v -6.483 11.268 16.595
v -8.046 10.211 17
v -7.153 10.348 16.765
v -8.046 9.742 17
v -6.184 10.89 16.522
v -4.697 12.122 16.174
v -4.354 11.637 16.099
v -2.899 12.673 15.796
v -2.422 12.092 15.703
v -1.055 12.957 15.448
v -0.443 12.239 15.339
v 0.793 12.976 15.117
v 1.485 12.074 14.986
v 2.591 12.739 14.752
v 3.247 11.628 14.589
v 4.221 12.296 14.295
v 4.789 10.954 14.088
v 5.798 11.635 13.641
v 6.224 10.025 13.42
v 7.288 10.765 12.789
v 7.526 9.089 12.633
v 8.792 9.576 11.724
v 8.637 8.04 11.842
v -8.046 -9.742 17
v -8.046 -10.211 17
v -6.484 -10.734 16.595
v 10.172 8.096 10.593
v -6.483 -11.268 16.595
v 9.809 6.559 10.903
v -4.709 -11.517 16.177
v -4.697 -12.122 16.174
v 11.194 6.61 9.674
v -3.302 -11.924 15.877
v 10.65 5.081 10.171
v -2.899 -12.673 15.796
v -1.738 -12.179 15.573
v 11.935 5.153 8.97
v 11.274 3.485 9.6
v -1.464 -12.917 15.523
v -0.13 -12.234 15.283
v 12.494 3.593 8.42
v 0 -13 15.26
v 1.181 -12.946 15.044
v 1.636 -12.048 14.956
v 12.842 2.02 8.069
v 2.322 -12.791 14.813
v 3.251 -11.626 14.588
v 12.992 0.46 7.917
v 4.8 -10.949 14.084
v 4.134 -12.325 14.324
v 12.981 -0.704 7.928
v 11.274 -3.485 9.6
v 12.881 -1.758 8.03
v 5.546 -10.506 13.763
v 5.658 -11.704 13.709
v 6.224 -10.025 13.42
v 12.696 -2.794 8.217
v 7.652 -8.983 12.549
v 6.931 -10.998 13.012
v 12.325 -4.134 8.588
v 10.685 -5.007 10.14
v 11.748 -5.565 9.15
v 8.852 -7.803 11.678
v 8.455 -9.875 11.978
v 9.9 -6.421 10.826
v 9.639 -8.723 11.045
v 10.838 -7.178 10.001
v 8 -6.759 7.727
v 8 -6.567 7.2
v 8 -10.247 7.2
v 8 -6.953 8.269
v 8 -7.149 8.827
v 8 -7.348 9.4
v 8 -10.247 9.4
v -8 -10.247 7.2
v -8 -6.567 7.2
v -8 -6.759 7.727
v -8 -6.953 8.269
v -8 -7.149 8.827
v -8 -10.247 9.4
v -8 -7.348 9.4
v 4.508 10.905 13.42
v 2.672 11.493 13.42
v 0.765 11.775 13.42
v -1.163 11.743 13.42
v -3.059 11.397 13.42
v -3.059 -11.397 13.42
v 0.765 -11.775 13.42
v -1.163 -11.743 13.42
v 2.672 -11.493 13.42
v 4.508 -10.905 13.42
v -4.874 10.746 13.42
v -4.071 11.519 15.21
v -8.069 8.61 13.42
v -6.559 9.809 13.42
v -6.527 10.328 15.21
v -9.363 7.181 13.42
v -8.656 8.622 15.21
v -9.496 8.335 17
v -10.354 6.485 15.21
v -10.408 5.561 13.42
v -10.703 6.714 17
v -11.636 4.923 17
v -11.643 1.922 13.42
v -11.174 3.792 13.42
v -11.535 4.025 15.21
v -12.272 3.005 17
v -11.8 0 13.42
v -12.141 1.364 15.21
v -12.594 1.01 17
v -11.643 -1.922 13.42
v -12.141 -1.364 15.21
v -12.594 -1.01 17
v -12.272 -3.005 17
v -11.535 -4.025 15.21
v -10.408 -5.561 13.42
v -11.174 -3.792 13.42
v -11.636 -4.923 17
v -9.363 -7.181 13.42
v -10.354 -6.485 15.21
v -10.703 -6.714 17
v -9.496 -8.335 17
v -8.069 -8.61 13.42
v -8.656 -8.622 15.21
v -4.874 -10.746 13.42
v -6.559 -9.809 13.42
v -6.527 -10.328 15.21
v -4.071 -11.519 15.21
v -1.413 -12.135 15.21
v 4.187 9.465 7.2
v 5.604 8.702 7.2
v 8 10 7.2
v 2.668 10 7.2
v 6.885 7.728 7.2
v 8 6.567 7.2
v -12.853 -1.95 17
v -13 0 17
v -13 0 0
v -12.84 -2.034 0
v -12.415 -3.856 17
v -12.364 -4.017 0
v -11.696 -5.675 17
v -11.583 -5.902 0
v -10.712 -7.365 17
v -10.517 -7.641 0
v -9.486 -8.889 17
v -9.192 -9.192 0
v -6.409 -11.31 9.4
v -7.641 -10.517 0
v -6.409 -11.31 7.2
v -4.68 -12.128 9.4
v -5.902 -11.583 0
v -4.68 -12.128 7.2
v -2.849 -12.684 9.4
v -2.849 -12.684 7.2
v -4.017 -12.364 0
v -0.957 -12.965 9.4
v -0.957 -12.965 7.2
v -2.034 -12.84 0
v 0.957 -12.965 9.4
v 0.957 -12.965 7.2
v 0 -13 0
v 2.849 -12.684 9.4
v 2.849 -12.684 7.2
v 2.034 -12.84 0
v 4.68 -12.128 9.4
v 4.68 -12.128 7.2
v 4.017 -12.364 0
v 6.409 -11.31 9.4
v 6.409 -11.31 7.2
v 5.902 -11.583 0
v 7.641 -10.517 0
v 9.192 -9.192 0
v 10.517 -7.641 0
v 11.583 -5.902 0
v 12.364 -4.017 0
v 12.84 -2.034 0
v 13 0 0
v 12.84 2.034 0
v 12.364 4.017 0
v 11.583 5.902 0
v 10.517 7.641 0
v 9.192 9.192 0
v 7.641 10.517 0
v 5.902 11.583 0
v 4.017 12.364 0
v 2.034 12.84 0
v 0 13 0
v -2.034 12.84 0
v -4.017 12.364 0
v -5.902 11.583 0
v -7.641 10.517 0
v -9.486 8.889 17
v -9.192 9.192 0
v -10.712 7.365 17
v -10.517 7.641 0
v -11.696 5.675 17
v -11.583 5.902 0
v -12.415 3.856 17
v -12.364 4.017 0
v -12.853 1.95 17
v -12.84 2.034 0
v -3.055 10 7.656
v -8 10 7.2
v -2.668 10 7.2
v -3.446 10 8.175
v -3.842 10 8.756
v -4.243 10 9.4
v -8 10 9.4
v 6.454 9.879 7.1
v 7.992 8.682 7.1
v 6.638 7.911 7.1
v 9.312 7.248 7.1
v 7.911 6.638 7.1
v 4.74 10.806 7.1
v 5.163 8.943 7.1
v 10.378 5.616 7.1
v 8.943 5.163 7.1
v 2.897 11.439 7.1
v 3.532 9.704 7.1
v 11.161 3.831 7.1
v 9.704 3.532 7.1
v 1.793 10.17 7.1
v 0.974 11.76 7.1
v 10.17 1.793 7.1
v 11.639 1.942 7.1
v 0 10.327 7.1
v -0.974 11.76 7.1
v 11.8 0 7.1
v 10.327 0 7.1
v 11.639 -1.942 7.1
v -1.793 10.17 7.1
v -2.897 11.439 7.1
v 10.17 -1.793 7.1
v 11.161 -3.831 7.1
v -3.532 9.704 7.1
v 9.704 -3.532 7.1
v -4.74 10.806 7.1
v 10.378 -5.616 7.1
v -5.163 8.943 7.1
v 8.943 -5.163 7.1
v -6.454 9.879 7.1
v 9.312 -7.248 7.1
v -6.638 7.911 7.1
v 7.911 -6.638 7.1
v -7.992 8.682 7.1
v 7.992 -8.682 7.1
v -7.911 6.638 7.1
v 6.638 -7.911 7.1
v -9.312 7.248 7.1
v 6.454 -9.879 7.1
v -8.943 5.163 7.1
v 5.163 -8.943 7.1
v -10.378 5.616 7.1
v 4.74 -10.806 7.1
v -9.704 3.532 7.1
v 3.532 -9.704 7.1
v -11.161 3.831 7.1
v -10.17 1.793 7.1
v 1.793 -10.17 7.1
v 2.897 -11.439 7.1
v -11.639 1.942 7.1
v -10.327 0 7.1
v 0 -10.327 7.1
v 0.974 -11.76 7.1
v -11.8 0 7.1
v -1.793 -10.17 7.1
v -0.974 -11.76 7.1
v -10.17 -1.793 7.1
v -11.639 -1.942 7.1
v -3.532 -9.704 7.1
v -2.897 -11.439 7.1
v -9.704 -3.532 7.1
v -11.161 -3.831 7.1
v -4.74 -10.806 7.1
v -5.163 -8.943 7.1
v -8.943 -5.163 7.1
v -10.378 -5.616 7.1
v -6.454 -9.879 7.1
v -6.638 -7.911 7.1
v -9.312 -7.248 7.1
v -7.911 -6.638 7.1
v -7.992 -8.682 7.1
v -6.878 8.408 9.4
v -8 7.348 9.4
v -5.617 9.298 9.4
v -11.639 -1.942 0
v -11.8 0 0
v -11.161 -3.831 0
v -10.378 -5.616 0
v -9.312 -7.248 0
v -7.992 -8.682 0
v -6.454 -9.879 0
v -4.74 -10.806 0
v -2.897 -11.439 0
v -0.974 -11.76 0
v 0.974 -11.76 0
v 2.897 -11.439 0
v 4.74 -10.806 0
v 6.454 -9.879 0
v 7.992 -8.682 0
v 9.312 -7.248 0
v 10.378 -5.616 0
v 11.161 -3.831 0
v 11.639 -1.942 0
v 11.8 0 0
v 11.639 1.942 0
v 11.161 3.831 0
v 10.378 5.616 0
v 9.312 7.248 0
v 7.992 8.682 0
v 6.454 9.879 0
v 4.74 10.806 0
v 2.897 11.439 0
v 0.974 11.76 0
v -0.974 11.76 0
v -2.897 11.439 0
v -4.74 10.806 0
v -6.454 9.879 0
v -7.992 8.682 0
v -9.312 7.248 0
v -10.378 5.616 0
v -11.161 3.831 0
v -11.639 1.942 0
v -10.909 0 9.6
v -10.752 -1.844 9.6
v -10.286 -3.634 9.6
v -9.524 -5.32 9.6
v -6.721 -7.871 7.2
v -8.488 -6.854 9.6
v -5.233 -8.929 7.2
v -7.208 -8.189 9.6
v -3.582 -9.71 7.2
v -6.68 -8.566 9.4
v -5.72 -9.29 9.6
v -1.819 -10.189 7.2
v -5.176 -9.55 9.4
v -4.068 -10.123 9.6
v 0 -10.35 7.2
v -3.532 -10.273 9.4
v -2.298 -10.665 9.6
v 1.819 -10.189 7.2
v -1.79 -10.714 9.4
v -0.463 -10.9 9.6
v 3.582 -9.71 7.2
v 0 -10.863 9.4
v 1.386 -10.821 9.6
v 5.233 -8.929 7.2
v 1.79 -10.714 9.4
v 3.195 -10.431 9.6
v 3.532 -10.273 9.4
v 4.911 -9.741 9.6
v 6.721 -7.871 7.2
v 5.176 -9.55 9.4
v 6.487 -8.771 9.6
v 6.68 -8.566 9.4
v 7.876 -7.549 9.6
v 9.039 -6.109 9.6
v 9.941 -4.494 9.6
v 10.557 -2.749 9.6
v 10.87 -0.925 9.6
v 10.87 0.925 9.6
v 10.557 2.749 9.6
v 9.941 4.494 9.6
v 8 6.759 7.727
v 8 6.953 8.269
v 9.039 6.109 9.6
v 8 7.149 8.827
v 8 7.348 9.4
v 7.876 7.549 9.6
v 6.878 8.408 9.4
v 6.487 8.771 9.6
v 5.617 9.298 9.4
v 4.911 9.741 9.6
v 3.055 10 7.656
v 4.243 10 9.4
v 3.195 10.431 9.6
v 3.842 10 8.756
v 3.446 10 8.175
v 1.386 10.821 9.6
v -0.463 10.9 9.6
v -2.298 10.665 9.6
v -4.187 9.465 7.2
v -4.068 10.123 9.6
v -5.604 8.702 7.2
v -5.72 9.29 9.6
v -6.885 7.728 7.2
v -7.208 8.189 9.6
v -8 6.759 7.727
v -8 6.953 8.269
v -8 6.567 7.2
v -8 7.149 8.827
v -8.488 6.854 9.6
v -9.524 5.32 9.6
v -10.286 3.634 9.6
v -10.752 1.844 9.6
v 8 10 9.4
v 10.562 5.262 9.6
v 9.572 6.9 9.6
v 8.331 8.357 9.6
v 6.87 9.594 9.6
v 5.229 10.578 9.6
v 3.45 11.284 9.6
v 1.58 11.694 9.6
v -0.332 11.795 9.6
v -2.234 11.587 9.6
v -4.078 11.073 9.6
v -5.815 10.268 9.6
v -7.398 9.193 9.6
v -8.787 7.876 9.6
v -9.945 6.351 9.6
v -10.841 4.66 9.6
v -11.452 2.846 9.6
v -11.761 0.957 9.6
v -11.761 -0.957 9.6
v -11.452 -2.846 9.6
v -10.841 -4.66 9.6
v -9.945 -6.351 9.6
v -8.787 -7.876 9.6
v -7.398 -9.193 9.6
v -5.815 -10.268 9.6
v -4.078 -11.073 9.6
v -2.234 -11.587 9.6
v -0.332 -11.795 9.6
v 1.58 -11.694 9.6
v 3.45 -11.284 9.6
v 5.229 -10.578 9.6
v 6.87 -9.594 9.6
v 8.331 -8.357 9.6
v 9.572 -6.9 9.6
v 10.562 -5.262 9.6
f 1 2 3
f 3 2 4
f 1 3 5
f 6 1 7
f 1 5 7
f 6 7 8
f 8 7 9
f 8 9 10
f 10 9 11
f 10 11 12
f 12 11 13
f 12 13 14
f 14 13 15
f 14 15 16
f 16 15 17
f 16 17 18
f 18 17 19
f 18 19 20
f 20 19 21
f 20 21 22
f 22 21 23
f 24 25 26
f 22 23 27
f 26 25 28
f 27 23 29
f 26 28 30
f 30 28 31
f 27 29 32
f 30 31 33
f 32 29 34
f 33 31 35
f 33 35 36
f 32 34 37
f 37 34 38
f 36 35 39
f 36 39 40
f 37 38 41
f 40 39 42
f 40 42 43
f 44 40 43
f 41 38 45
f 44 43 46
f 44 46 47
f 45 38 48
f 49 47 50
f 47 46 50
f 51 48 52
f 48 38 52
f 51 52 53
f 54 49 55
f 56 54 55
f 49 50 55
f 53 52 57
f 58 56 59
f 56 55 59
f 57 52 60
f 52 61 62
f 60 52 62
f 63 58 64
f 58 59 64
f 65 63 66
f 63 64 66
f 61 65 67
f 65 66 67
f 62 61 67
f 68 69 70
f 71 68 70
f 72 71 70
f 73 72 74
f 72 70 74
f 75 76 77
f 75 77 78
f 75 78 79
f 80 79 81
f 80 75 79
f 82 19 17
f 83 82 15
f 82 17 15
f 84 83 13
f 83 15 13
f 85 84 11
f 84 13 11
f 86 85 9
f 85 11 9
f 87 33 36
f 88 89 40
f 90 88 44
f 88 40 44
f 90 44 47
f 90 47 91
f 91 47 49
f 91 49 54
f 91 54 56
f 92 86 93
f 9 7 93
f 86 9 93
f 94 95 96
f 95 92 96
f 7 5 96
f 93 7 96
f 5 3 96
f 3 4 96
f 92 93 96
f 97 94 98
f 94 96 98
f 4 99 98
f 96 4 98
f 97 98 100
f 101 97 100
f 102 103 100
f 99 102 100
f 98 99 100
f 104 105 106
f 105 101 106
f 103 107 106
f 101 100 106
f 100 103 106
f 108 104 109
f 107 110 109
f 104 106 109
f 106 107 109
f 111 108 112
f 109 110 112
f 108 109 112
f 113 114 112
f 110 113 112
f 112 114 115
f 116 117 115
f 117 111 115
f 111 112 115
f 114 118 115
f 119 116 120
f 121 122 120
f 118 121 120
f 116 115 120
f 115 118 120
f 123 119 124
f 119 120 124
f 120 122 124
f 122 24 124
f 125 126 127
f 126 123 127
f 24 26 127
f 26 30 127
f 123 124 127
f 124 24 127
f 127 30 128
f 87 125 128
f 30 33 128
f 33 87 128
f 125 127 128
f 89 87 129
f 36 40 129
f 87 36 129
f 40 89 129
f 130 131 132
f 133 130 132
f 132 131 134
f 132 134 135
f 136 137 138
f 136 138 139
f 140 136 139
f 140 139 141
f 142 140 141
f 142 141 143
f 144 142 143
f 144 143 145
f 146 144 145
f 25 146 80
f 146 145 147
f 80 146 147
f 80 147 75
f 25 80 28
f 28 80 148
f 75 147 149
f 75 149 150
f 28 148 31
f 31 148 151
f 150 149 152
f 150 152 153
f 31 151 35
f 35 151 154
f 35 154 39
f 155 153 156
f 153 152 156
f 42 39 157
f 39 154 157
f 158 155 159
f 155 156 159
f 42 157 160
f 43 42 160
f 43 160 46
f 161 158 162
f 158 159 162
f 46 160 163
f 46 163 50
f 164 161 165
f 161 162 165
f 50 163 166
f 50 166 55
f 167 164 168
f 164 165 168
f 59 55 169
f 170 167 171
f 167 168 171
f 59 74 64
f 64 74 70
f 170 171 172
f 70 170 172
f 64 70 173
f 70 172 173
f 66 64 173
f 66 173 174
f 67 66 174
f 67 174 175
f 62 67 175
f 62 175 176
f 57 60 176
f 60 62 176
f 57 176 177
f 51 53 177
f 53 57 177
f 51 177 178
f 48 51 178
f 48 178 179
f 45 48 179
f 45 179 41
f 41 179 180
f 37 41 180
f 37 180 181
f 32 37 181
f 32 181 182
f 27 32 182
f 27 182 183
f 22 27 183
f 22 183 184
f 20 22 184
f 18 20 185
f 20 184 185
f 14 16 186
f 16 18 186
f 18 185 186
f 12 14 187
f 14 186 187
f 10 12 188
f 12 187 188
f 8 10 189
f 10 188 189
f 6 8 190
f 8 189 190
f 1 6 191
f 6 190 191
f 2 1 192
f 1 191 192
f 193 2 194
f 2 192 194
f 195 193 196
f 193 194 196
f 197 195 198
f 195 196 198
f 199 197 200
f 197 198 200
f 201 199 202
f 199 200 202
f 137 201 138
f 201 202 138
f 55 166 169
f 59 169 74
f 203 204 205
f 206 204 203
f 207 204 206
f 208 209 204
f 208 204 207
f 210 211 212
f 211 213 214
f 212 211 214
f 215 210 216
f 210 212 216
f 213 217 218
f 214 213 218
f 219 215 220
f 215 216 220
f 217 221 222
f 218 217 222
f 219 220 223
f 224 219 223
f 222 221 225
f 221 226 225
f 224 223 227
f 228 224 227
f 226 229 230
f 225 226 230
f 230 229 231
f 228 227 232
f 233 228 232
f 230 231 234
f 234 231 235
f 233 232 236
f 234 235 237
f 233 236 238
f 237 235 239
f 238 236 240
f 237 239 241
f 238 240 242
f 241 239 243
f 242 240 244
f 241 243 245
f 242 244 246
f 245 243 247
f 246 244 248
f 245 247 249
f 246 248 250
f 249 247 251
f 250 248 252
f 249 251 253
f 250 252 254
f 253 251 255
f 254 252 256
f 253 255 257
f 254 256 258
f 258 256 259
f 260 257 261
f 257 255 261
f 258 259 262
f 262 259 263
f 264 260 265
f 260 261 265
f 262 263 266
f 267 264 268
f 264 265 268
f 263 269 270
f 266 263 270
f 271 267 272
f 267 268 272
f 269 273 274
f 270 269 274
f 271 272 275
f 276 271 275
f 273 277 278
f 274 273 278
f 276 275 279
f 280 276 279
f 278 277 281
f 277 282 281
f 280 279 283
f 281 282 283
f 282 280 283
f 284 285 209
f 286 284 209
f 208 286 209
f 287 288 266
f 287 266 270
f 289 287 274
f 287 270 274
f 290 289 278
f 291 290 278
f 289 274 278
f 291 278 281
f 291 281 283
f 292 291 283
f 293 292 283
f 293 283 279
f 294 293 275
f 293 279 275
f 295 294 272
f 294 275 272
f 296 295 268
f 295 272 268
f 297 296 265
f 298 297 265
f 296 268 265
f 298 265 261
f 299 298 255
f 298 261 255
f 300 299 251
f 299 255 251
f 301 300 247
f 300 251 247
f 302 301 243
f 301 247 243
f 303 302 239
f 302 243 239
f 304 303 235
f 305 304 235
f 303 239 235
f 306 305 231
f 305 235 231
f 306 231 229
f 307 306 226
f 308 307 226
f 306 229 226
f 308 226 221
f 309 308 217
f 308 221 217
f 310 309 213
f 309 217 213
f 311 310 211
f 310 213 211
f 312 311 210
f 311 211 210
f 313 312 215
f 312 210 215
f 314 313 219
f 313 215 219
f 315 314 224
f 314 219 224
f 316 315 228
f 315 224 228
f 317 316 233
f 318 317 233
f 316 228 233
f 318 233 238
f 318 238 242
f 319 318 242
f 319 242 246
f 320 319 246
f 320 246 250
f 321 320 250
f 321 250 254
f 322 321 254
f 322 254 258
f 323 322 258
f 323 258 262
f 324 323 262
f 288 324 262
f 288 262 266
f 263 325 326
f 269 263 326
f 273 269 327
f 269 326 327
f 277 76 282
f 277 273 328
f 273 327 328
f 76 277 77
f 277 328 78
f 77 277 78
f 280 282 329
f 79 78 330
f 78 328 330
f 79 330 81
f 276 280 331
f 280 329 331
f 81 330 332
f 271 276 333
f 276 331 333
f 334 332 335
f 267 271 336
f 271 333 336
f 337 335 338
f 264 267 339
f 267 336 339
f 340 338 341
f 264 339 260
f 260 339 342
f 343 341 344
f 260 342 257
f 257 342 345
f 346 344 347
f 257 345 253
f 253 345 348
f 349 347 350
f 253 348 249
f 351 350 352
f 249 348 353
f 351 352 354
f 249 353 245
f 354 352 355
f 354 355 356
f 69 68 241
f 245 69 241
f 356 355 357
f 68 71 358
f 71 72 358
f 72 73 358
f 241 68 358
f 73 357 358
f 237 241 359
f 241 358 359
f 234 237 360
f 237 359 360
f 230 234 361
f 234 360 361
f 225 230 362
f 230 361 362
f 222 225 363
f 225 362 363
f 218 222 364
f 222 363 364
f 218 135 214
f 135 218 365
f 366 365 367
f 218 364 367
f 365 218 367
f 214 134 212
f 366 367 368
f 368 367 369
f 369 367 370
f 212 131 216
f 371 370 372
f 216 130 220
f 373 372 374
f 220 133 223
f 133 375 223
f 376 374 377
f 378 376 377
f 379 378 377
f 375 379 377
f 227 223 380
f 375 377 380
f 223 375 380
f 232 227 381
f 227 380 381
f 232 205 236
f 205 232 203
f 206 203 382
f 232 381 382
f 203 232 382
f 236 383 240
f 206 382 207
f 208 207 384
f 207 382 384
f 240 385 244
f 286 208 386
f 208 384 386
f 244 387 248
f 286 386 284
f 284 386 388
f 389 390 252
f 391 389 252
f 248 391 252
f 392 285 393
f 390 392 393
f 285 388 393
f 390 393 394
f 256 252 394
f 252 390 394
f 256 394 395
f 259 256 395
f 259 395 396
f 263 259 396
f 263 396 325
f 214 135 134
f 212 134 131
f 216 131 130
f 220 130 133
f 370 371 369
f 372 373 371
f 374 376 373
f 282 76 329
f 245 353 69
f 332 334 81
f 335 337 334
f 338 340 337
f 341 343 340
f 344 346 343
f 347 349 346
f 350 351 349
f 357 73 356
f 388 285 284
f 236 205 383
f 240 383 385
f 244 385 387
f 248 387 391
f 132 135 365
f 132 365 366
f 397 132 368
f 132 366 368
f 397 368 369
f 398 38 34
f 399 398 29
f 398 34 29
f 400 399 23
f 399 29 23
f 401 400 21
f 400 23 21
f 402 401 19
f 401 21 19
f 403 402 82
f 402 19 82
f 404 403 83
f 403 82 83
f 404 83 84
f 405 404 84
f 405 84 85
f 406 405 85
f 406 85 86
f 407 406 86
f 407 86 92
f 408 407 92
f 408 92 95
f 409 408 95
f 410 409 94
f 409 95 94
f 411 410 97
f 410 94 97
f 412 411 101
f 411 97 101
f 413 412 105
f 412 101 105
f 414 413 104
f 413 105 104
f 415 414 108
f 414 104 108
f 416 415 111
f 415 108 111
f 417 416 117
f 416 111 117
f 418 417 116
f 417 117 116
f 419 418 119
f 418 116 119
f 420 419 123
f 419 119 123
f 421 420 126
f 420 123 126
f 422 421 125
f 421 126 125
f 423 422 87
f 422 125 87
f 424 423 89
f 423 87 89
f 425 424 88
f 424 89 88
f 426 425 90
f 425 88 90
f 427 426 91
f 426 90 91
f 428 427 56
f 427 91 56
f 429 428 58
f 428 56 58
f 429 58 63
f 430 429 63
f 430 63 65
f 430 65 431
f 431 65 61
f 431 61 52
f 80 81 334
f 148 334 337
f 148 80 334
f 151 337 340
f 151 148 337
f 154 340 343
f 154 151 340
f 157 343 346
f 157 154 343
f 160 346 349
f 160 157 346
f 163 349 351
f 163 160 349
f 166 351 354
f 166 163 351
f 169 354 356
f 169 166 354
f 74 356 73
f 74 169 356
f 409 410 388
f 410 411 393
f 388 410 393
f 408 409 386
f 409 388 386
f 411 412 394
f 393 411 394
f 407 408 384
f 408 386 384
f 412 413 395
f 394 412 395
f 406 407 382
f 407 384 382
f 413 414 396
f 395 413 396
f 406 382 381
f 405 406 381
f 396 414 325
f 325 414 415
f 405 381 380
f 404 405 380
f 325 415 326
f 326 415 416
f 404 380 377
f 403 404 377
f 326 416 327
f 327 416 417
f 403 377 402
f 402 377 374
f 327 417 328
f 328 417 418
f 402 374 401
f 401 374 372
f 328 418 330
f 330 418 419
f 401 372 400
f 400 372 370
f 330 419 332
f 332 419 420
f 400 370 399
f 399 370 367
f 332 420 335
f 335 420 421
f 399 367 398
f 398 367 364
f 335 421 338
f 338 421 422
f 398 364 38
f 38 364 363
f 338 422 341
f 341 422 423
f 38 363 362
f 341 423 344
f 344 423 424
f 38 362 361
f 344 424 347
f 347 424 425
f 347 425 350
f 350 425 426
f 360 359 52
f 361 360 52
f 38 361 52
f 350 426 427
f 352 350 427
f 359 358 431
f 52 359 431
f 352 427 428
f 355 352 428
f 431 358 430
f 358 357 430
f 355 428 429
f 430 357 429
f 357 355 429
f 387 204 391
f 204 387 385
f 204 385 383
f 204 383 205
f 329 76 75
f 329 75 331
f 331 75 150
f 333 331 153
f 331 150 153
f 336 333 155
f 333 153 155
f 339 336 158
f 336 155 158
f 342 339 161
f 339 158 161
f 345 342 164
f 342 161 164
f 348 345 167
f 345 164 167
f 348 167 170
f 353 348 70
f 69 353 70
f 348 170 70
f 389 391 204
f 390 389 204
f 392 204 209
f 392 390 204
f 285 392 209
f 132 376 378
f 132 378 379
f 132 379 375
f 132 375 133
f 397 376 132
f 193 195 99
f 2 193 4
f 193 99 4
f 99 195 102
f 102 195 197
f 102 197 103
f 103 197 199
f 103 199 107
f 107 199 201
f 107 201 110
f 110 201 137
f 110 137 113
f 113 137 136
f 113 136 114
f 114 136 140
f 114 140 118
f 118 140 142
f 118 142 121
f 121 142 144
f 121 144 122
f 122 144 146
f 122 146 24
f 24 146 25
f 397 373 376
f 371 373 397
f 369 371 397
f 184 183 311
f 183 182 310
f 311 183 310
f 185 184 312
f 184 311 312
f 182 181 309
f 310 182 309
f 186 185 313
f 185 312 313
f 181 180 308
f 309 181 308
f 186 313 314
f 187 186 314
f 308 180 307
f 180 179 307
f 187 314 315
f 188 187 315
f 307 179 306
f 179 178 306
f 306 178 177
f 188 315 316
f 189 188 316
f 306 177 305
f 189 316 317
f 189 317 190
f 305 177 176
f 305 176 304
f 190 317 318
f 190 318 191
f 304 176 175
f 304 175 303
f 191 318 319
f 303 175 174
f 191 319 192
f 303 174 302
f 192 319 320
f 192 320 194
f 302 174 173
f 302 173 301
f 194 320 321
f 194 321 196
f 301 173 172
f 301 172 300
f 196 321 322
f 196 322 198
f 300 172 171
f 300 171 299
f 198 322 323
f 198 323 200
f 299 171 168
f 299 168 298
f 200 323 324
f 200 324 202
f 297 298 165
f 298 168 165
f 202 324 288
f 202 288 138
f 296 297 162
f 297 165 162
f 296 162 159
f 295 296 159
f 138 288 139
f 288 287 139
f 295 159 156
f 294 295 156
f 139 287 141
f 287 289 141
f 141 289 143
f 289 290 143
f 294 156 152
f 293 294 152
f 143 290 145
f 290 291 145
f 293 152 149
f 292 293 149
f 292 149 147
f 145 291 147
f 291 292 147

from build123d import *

# Parameters (mm, degrees)
F4_DEPTH = 26.001
F3_W     = 16
F3_H     = 2.2
F5_DEPTH = 23


with BuildPart() as f1:
    # F0 (on Front) → F1 (revolve)
    with BuildSketch(Plane.XZ):
        Polygon((-13, 0), (-11.8, 0), (-11.8, 7.1), (-11.8, 9.6), (-11.8, 13.4200323373), (-12.6346228644, 17), (-13, 17), align=None)
        Polygon((-11.8, 9.6), (-11.8, 7.1), (-10.3265667208, 7.1), (-10.9094091813, 9.6), align=None)
    revolve(axis=Axis((0, 0, 8.5), (0, 0, 1)))

    # F3 (on offset) → F4 (cut, through all)
    with BuildSketch(Plane.XZ.offset(13)):
        with BuildLine():
            add(Edge.make_bspline(
                [(-9.9011575398, 17.5226589309), (-10.2594239129, 18.308274348), (-11.2375961727, 20.4532348174), (-2.9366854637, 21.7150870272), (14.527182625, 22.1780936044), (24.3522467857, 14.4704645715), (20.6659768906, 6.8973925089), (20.535883493, 6.3841777406), (18.5511625655, 4.67363665), (17.0875235032, 3.4121924222)],
                knots=[0, 0, 0, 0, 0.0870359311, 0.2376336152, 0.4909532197, 0.6806586372, 0.8308190148, 0.8752369186, 1, 1, 1, 1], degree=3))
            add(Edge.make_bspline(
                [(-9.9011575398, 17.5226589309), (-1.0566617884, 14.9280194281), (5.2971986995, 15.8914451573), (12.9903821447, 8.1766160182), (17.0875235032, 3.4121924222)],
                knots=[0, 0, 0, 0, 0.5060819041, 1, 1, 1, 1], degree=3))
        make_face()
    extrude(amount=-F4_DEPTH, mode=Mode.SUBTRACT)

    # F3 (on offset) → F5 (cut)
    with BuildSketch(Plane.XZ.offset(13)):
        with Locations((0, 8.3)):
            Rectangle(F3_W, F3_H)
    extrude(amount=-F5_DEPTH, mode=Mode.SUBTRACT)


solid = f1.part
